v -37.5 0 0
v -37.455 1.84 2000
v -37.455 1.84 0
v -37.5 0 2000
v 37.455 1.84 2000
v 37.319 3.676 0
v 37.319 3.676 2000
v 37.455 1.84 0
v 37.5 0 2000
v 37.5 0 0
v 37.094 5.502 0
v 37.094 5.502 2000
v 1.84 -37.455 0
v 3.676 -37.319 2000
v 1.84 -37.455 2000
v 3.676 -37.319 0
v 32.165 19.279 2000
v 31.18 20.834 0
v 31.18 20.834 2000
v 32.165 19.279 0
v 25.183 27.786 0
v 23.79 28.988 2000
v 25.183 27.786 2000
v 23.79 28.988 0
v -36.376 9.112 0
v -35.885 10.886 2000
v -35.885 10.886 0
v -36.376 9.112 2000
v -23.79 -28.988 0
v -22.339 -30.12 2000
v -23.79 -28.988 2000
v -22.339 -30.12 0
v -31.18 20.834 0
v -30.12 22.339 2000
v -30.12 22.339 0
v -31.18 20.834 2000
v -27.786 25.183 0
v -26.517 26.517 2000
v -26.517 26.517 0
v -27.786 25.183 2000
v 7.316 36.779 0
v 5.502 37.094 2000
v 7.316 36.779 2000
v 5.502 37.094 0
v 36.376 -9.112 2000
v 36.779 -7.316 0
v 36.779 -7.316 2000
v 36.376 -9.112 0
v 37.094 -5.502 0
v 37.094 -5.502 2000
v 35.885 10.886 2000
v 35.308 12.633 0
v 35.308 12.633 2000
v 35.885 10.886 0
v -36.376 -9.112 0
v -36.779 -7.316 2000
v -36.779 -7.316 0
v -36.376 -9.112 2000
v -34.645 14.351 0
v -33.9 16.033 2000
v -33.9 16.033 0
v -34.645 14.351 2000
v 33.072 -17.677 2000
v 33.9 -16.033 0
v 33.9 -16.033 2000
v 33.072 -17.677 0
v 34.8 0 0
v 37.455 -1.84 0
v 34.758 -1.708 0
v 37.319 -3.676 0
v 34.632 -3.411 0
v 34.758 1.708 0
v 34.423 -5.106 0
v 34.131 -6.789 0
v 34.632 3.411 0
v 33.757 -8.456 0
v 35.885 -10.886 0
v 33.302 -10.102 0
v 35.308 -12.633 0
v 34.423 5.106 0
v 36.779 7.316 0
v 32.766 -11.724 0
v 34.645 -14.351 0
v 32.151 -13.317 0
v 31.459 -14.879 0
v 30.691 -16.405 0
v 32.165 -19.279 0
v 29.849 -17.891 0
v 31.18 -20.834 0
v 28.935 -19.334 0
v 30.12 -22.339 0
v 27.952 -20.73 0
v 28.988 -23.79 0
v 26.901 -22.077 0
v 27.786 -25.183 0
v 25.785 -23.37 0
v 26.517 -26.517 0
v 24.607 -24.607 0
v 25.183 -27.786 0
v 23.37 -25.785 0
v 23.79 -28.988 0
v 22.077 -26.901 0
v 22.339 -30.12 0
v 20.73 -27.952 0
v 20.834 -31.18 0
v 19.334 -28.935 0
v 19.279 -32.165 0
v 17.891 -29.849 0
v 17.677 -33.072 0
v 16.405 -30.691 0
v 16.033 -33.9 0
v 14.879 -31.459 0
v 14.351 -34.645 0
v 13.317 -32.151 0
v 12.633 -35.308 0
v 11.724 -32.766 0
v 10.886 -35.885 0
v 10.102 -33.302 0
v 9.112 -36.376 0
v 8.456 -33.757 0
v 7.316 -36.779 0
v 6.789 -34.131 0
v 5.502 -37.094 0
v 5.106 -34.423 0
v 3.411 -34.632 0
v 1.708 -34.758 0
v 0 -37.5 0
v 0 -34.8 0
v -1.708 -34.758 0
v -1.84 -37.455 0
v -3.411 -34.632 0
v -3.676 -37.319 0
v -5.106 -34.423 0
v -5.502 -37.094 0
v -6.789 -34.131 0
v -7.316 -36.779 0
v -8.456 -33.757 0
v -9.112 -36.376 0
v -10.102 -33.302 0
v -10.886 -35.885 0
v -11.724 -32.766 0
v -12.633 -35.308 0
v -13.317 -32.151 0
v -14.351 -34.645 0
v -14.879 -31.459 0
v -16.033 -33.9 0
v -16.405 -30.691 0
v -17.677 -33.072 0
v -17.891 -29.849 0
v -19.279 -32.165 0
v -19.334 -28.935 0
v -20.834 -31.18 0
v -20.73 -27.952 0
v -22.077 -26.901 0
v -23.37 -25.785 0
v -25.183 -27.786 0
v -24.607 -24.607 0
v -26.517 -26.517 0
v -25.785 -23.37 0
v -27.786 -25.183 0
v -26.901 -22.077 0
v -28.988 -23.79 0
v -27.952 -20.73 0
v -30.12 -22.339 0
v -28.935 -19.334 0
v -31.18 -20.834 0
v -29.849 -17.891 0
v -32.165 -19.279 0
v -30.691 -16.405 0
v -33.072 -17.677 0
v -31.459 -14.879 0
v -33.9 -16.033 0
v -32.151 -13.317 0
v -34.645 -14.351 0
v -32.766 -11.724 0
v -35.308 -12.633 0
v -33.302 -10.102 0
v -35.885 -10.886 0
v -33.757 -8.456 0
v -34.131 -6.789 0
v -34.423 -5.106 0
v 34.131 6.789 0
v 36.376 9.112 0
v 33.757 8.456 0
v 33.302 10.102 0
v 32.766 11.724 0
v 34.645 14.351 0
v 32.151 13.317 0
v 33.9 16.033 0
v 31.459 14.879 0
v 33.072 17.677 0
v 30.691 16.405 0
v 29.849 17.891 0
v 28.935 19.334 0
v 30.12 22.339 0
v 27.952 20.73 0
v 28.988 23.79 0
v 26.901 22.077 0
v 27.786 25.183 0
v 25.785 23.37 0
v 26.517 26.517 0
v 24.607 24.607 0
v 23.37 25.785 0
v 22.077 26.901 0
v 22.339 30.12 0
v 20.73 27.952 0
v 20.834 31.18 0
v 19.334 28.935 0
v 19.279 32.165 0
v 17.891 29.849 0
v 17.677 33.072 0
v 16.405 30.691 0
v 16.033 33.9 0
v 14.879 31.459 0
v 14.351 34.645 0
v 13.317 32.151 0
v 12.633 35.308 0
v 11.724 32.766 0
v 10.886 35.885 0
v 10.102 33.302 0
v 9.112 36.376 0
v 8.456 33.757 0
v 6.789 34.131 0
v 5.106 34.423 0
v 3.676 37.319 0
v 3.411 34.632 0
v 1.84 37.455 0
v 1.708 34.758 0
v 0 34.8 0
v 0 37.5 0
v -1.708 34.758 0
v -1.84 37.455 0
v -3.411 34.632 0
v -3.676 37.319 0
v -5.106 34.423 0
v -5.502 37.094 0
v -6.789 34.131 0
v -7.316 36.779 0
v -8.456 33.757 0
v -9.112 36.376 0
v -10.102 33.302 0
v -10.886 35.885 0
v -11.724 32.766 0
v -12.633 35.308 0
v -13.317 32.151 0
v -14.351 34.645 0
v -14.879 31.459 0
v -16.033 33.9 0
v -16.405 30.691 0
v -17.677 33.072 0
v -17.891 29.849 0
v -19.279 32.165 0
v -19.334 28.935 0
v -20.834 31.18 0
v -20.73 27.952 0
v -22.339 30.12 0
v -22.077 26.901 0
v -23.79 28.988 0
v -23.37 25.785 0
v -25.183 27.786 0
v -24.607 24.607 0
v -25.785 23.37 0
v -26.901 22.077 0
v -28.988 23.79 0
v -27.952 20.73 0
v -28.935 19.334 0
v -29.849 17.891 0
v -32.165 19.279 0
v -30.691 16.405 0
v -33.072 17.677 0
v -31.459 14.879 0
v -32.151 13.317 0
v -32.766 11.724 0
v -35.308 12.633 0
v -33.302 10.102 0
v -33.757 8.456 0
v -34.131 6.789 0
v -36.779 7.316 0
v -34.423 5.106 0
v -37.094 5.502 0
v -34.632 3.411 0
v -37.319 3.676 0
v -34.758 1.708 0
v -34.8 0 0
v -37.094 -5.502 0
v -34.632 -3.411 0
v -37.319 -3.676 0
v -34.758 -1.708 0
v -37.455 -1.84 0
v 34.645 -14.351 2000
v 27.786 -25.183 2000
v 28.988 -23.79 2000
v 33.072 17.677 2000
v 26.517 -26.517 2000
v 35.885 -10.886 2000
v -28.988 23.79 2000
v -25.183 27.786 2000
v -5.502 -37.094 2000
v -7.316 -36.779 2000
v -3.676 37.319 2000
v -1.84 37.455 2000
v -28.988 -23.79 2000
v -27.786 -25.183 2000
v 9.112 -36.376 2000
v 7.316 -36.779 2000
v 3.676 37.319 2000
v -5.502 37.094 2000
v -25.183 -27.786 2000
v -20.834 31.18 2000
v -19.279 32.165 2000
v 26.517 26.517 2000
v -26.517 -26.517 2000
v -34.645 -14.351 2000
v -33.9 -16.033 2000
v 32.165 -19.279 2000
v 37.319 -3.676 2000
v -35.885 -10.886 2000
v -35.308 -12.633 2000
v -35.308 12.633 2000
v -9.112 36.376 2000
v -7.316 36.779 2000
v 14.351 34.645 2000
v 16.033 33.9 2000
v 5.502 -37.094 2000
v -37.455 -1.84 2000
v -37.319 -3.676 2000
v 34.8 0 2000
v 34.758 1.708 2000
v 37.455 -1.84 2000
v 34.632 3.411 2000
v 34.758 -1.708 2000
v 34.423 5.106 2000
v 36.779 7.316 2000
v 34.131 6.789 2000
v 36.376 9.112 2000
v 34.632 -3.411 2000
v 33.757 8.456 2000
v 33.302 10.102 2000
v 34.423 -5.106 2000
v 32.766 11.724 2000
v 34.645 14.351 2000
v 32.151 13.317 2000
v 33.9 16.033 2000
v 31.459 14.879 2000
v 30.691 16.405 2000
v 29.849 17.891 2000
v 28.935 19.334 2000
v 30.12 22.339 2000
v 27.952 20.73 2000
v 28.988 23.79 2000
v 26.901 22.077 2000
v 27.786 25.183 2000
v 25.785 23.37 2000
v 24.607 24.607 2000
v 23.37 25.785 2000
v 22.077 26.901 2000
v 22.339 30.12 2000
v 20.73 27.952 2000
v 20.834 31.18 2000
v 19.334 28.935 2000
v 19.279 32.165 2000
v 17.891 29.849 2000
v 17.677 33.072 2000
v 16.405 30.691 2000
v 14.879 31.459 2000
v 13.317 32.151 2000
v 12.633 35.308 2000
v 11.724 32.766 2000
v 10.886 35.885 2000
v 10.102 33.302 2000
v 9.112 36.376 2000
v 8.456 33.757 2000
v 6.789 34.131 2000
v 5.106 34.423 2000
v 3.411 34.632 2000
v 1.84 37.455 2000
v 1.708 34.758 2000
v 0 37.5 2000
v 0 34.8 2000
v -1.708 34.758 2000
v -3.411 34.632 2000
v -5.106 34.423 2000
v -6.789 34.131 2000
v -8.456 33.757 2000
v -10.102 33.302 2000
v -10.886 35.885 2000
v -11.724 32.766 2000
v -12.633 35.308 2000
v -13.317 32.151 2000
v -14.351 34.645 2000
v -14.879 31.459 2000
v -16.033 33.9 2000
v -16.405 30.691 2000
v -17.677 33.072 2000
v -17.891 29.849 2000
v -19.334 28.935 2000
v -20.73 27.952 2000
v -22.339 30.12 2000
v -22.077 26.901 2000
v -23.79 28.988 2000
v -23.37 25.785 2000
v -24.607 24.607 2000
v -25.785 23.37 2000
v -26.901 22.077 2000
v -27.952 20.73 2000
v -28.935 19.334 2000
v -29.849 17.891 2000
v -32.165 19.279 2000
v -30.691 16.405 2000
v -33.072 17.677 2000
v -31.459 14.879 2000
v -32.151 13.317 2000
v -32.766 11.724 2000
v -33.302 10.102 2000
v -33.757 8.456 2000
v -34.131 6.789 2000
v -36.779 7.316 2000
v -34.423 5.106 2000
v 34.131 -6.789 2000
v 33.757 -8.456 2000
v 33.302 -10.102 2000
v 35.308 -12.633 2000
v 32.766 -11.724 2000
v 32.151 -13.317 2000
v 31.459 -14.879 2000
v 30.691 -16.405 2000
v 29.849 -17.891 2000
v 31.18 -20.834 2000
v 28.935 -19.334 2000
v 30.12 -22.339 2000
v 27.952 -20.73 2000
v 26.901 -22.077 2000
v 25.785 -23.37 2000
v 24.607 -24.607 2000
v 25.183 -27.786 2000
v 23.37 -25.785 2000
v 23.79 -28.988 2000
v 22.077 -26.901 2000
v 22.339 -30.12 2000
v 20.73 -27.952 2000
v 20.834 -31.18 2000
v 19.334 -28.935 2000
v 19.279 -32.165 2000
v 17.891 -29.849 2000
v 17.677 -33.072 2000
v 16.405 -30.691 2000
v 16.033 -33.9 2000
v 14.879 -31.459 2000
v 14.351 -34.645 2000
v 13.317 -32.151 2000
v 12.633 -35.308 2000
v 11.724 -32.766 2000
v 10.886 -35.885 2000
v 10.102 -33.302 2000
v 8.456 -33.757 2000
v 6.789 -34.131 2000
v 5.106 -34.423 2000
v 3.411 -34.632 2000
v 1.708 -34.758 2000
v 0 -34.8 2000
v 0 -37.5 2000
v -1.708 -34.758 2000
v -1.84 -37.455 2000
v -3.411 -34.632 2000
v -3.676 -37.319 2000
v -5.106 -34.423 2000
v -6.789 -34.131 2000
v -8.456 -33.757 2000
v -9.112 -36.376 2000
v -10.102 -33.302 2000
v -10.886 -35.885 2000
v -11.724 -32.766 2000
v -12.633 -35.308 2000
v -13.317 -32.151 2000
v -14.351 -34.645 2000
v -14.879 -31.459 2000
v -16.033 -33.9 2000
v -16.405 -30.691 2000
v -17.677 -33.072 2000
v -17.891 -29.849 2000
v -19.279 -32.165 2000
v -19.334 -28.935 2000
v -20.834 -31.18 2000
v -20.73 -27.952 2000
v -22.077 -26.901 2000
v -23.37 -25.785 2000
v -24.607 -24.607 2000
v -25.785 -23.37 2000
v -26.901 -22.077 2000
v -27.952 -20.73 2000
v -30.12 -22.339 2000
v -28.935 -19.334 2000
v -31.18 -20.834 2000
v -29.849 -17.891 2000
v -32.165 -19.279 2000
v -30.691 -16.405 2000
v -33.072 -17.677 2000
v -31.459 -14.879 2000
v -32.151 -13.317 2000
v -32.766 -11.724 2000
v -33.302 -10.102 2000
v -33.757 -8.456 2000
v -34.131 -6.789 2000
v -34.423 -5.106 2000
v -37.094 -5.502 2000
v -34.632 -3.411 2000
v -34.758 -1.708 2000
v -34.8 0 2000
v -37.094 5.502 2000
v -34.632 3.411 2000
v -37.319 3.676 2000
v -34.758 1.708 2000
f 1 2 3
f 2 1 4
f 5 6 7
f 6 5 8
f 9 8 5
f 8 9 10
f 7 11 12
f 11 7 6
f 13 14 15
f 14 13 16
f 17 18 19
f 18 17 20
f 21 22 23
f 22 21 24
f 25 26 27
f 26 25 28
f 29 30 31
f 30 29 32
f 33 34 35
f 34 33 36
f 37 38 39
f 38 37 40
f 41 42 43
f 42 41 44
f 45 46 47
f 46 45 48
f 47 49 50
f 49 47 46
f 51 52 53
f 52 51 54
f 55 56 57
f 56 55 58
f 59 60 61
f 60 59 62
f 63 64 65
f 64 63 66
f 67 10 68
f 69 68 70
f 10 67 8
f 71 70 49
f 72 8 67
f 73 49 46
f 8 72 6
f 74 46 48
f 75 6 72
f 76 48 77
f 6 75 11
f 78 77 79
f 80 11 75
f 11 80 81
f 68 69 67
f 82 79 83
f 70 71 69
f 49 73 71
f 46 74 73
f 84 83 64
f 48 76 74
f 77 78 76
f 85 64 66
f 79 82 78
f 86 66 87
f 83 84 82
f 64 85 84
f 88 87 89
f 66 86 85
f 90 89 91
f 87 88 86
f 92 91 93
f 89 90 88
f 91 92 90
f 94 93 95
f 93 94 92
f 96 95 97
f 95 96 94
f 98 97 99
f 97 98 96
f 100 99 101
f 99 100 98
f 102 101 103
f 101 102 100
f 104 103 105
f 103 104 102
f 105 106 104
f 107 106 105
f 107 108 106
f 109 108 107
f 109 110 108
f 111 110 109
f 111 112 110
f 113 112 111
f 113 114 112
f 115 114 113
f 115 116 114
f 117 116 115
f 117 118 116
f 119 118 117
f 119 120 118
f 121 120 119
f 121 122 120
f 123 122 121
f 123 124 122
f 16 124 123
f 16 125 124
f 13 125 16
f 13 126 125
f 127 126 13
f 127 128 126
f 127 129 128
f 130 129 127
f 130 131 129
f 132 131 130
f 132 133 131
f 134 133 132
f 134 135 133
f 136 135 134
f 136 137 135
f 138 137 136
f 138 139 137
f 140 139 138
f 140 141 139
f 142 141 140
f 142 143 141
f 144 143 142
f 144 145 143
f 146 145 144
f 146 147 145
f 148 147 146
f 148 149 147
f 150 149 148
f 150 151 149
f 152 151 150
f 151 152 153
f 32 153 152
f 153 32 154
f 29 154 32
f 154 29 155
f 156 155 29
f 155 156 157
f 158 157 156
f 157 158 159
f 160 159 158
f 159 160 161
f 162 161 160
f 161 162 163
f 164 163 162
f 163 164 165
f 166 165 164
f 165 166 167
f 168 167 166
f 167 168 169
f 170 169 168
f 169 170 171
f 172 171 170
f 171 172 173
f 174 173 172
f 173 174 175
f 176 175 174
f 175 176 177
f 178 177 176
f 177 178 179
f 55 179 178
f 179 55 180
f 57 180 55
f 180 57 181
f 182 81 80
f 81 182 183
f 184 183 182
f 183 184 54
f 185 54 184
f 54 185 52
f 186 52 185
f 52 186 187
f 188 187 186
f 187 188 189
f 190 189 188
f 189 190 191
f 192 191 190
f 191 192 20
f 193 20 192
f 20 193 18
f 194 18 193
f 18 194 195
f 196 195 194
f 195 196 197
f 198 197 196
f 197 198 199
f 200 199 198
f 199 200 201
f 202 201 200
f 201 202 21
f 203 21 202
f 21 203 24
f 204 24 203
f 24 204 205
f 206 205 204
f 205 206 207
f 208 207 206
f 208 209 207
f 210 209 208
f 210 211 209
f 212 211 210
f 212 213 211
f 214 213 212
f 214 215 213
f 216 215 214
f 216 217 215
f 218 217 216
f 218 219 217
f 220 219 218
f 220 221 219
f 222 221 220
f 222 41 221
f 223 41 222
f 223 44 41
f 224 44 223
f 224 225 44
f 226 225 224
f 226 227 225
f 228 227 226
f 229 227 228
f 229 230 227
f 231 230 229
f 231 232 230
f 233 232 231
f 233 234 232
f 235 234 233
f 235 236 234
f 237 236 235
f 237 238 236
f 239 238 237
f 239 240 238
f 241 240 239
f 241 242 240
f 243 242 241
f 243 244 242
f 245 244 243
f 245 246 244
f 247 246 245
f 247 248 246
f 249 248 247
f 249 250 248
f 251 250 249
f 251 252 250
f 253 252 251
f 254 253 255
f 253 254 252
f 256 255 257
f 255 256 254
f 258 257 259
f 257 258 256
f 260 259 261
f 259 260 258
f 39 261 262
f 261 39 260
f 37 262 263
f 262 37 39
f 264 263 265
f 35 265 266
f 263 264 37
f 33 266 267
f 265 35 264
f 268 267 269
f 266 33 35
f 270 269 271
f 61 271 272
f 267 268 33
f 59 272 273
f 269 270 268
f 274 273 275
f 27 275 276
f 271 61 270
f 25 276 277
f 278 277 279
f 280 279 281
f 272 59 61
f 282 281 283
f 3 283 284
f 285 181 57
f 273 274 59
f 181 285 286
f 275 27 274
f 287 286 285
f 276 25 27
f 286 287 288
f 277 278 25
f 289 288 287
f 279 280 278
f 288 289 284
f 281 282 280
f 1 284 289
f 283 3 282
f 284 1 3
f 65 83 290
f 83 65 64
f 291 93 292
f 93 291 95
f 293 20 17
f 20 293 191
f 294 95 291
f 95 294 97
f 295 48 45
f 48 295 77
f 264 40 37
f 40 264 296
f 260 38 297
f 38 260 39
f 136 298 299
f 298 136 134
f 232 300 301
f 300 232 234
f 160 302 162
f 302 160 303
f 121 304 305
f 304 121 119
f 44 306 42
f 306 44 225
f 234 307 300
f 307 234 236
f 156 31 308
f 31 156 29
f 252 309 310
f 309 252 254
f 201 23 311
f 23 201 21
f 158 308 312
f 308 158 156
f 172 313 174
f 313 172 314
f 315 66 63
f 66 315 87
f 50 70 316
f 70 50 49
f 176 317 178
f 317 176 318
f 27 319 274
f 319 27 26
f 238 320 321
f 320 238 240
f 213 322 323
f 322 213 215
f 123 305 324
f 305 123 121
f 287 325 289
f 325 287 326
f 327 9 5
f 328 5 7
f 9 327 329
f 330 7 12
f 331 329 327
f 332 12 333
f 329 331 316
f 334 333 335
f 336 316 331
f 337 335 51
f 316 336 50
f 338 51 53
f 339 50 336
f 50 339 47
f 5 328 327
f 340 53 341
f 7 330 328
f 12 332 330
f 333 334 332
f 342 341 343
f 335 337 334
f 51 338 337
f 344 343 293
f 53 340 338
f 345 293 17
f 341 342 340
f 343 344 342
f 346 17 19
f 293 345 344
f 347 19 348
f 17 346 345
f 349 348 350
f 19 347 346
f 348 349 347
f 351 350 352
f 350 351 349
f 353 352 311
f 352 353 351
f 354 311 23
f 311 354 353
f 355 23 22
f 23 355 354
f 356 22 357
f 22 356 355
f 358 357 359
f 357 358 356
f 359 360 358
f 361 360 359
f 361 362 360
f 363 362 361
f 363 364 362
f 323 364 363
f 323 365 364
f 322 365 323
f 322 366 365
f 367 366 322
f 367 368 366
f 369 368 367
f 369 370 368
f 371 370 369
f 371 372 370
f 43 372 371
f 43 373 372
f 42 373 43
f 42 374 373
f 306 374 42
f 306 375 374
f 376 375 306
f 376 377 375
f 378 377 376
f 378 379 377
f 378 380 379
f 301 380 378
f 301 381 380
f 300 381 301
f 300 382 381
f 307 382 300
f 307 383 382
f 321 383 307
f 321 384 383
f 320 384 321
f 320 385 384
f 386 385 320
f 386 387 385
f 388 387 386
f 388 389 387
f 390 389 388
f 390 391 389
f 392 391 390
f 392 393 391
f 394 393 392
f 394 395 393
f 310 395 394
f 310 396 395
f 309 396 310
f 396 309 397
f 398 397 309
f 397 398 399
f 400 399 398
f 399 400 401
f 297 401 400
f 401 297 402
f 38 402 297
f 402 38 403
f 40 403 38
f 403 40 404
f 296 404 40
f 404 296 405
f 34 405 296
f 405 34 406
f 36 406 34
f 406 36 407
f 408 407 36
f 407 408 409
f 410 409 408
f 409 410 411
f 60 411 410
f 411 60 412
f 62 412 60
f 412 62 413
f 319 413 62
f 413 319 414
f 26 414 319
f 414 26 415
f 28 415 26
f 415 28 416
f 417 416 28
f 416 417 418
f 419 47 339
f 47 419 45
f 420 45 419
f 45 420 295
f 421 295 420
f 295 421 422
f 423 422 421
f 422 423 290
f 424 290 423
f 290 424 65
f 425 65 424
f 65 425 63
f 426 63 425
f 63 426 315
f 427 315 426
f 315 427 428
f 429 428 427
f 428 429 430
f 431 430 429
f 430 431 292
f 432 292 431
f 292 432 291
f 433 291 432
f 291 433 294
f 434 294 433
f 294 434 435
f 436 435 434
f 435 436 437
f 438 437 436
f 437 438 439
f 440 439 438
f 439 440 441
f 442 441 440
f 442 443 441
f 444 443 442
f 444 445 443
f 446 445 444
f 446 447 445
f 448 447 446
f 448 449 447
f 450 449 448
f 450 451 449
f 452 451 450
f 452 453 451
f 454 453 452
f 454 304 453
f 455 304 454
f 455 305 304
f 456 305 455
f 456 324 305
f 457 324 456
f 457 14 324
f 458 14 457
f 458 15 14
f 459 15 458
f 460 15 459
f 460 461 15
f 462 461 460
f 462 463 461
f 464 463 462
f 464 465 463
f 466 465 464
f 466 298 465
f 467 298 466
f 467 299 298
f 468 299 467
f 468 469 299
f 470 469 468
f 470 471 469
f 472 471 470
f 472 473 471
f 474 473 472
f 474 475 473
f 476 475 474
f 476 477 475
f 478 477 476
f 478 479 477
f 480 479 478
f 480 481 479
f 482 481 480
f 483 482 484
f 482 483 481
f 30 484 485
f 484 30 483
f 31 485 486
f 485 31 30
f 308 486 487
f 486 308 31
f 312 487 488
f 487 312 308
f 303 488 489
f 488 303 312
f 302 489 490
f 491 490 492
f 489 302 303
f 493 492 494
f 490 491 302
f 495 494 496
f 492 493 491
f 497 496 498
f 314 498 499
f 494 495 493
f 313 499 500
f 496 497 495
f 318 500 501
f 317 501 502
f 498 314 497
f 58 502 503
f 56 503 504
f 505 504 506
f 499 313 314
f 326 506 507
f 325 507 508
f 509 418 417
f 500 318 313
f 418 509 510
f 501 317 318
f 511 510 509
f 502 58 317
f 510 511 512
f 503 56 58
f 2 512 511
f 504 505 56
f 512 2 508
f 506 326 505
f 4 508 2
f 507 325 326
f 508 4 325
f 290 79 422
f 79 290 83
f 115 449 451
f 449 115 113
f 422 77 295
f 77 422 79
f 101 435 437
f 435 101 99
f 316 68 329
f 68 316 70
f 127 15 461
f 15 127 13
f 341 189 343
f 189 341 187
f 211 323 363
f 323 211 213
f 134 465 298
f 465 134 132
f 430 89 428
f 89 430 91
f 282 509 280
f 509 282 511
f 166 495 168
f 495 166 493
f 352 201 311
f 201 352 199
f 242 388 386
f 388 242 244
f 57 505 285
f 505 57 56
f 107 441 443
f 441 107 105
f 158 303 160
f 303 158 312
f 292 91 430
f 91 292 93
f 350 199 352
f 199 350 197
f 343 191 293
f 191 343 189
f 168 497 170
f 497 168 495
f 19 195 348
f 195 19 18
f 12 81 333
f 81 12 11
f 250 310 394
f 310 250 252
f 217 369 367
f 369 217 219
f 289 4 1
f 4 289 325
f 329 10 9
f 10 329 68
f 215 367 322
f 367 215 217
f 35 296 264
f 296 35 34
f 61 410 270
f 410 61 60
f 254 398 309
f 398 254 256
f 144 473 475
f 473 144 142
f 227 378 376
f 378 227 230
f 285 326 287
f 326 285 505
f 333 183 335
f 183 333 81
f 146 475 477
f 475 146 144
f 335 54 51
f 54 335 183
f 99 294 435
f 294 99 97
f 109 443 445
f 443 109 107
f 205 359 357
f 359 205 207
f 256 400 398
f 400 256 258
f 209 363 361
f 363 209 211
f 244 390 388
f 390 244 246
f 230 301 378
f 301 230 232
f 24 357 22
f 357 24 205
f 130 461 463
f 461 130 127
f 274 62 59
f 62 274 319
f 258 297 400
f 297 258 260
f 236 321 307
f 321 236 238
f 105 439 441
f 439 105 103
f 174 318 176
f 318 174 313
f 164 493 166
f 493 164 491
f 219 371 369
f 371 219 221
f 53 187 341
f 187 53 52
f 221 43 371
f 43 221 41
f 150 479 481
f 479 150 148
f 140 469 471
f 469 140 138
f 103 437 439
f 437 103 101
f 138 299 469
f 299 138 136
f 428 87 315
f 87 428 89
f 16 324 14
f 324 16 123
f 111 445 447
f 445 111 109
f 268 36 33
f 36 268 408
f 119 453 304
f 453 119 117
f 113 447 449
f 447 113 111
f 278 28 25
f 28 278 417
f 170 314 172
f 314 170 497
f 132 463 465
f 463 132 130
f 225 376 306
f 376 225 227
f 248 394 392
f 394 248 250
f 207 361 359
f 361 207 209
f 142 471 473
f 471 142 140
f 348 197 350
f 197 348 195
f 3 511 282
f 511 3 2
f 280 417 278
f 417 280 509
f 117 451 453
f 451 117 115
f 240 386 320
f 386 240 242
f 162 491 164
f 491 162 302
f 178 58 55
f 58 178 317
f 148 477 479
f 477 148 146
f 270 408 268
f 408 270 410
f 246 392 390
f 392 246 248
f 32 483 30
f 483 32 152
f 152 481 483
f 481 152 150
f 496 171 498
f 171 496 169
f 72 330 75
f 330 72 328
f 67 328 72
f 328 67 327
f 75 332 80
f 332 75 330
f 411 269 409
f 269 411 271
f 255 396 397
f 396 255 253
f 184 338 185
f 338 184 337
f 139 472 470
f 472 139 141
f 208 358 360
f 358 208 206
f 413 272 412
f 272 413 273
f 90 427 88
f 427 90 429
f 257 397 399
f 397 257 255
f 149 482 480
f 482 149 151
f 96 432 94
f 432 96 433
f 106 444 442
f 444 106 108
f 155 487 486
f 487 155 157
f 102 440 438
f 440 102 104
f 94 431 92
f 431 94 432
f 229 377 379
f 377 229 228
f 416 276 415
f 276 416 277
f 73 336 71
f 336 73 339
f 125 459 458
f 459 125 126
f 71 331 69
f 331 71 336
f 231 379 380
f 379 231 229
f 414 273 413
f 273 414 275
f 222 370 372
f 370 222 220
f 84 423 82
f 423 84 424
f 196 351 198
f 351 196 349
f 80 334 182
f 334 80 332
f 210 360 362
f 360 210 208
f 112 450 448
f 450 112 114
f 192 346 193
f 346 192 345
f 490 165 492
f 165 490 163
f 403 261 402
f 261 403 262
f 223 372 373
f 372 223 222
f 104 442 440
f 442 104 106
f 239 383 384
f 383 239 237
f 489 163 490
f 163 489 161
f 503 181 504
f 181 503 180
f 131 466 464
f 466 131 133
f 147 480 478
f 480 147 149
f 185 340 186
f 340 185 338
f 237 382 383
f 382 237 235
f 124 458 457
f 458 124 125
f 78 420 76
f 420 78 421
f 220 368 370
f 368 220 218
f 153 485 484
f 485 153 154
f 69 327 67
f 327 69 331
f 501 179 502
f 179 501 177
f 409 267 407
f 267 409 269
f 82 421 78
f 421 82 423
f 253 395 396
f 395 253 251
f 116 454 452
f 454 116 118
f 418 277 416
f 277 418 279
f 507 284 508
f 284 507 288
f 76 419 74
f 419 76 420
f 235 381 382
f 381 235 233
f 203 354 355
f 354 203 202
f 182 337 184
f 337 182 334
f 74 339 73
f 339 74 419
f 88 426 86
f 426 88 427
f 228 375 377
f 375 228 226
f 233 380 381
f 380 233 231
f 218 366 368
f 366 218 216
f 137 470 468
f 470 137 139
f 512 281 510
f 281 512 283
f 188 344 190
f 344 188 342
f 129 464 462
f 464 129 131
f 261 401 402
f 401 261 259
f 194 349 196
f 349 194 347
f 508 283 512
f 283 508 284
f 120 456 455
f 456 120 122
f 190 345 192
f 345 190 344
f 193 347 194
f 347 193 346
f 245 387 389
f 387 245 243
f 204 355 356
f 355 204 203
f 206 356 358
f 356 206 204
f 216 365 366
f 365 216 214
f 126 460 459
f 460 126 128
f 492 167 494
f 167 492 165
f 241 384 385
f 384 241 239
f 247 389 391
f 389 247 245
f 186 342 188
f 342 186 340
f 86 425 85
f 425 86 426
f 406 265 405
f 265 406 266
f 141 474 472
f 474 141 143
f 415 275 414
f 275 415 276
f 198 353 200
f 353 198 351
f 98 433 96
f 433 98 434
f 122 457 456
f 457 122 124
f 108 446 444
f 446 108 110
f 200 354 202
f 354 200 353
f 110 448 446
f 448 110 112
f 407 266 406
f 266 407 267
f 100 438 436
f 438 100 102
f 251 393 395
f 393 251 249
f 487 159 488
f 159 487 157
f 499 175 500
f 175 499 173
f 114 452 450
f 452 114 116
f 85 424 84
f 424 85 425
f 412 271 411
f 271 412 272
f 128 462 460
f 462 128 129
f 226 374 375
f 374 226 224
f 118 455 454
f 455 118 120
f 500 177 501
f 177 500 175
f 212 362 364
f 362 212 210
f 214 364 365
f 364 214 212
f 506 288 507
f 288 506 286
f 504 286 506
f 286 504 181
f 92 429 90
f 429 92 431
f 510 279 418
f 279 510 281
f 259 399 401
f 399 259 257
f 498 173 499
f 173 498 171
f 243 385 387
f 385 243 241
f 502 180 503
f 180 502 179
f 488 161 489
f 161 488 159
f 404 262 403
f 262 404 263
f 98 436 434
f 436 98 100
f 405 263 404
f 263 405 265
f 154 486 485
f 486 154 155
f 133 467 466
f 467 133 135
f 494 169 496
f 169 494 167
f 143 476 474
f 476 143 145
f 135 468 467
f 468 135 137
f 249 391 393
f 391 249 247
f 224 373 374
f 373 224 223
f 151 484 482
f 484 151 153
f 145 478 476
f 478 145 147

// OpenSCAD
$fn = 128;

// HT 75 pipe, length 2000 mm (approx. DN75)
// Typical HT pipe outer diameter ~75 mm; wall thickness ~2.7 mm (approx.)
od = 75;
wall = 2.7;
id = od - 2*wall;
len = 2000;

module ht_pipe(od, id, len) {
    difference() {
        cylinder(h = len, d = od);
        translate([0,0,-0.5])
            cylinder(h = len + 1, d = id);
    }
}

ht_pipe(od, id, len);
